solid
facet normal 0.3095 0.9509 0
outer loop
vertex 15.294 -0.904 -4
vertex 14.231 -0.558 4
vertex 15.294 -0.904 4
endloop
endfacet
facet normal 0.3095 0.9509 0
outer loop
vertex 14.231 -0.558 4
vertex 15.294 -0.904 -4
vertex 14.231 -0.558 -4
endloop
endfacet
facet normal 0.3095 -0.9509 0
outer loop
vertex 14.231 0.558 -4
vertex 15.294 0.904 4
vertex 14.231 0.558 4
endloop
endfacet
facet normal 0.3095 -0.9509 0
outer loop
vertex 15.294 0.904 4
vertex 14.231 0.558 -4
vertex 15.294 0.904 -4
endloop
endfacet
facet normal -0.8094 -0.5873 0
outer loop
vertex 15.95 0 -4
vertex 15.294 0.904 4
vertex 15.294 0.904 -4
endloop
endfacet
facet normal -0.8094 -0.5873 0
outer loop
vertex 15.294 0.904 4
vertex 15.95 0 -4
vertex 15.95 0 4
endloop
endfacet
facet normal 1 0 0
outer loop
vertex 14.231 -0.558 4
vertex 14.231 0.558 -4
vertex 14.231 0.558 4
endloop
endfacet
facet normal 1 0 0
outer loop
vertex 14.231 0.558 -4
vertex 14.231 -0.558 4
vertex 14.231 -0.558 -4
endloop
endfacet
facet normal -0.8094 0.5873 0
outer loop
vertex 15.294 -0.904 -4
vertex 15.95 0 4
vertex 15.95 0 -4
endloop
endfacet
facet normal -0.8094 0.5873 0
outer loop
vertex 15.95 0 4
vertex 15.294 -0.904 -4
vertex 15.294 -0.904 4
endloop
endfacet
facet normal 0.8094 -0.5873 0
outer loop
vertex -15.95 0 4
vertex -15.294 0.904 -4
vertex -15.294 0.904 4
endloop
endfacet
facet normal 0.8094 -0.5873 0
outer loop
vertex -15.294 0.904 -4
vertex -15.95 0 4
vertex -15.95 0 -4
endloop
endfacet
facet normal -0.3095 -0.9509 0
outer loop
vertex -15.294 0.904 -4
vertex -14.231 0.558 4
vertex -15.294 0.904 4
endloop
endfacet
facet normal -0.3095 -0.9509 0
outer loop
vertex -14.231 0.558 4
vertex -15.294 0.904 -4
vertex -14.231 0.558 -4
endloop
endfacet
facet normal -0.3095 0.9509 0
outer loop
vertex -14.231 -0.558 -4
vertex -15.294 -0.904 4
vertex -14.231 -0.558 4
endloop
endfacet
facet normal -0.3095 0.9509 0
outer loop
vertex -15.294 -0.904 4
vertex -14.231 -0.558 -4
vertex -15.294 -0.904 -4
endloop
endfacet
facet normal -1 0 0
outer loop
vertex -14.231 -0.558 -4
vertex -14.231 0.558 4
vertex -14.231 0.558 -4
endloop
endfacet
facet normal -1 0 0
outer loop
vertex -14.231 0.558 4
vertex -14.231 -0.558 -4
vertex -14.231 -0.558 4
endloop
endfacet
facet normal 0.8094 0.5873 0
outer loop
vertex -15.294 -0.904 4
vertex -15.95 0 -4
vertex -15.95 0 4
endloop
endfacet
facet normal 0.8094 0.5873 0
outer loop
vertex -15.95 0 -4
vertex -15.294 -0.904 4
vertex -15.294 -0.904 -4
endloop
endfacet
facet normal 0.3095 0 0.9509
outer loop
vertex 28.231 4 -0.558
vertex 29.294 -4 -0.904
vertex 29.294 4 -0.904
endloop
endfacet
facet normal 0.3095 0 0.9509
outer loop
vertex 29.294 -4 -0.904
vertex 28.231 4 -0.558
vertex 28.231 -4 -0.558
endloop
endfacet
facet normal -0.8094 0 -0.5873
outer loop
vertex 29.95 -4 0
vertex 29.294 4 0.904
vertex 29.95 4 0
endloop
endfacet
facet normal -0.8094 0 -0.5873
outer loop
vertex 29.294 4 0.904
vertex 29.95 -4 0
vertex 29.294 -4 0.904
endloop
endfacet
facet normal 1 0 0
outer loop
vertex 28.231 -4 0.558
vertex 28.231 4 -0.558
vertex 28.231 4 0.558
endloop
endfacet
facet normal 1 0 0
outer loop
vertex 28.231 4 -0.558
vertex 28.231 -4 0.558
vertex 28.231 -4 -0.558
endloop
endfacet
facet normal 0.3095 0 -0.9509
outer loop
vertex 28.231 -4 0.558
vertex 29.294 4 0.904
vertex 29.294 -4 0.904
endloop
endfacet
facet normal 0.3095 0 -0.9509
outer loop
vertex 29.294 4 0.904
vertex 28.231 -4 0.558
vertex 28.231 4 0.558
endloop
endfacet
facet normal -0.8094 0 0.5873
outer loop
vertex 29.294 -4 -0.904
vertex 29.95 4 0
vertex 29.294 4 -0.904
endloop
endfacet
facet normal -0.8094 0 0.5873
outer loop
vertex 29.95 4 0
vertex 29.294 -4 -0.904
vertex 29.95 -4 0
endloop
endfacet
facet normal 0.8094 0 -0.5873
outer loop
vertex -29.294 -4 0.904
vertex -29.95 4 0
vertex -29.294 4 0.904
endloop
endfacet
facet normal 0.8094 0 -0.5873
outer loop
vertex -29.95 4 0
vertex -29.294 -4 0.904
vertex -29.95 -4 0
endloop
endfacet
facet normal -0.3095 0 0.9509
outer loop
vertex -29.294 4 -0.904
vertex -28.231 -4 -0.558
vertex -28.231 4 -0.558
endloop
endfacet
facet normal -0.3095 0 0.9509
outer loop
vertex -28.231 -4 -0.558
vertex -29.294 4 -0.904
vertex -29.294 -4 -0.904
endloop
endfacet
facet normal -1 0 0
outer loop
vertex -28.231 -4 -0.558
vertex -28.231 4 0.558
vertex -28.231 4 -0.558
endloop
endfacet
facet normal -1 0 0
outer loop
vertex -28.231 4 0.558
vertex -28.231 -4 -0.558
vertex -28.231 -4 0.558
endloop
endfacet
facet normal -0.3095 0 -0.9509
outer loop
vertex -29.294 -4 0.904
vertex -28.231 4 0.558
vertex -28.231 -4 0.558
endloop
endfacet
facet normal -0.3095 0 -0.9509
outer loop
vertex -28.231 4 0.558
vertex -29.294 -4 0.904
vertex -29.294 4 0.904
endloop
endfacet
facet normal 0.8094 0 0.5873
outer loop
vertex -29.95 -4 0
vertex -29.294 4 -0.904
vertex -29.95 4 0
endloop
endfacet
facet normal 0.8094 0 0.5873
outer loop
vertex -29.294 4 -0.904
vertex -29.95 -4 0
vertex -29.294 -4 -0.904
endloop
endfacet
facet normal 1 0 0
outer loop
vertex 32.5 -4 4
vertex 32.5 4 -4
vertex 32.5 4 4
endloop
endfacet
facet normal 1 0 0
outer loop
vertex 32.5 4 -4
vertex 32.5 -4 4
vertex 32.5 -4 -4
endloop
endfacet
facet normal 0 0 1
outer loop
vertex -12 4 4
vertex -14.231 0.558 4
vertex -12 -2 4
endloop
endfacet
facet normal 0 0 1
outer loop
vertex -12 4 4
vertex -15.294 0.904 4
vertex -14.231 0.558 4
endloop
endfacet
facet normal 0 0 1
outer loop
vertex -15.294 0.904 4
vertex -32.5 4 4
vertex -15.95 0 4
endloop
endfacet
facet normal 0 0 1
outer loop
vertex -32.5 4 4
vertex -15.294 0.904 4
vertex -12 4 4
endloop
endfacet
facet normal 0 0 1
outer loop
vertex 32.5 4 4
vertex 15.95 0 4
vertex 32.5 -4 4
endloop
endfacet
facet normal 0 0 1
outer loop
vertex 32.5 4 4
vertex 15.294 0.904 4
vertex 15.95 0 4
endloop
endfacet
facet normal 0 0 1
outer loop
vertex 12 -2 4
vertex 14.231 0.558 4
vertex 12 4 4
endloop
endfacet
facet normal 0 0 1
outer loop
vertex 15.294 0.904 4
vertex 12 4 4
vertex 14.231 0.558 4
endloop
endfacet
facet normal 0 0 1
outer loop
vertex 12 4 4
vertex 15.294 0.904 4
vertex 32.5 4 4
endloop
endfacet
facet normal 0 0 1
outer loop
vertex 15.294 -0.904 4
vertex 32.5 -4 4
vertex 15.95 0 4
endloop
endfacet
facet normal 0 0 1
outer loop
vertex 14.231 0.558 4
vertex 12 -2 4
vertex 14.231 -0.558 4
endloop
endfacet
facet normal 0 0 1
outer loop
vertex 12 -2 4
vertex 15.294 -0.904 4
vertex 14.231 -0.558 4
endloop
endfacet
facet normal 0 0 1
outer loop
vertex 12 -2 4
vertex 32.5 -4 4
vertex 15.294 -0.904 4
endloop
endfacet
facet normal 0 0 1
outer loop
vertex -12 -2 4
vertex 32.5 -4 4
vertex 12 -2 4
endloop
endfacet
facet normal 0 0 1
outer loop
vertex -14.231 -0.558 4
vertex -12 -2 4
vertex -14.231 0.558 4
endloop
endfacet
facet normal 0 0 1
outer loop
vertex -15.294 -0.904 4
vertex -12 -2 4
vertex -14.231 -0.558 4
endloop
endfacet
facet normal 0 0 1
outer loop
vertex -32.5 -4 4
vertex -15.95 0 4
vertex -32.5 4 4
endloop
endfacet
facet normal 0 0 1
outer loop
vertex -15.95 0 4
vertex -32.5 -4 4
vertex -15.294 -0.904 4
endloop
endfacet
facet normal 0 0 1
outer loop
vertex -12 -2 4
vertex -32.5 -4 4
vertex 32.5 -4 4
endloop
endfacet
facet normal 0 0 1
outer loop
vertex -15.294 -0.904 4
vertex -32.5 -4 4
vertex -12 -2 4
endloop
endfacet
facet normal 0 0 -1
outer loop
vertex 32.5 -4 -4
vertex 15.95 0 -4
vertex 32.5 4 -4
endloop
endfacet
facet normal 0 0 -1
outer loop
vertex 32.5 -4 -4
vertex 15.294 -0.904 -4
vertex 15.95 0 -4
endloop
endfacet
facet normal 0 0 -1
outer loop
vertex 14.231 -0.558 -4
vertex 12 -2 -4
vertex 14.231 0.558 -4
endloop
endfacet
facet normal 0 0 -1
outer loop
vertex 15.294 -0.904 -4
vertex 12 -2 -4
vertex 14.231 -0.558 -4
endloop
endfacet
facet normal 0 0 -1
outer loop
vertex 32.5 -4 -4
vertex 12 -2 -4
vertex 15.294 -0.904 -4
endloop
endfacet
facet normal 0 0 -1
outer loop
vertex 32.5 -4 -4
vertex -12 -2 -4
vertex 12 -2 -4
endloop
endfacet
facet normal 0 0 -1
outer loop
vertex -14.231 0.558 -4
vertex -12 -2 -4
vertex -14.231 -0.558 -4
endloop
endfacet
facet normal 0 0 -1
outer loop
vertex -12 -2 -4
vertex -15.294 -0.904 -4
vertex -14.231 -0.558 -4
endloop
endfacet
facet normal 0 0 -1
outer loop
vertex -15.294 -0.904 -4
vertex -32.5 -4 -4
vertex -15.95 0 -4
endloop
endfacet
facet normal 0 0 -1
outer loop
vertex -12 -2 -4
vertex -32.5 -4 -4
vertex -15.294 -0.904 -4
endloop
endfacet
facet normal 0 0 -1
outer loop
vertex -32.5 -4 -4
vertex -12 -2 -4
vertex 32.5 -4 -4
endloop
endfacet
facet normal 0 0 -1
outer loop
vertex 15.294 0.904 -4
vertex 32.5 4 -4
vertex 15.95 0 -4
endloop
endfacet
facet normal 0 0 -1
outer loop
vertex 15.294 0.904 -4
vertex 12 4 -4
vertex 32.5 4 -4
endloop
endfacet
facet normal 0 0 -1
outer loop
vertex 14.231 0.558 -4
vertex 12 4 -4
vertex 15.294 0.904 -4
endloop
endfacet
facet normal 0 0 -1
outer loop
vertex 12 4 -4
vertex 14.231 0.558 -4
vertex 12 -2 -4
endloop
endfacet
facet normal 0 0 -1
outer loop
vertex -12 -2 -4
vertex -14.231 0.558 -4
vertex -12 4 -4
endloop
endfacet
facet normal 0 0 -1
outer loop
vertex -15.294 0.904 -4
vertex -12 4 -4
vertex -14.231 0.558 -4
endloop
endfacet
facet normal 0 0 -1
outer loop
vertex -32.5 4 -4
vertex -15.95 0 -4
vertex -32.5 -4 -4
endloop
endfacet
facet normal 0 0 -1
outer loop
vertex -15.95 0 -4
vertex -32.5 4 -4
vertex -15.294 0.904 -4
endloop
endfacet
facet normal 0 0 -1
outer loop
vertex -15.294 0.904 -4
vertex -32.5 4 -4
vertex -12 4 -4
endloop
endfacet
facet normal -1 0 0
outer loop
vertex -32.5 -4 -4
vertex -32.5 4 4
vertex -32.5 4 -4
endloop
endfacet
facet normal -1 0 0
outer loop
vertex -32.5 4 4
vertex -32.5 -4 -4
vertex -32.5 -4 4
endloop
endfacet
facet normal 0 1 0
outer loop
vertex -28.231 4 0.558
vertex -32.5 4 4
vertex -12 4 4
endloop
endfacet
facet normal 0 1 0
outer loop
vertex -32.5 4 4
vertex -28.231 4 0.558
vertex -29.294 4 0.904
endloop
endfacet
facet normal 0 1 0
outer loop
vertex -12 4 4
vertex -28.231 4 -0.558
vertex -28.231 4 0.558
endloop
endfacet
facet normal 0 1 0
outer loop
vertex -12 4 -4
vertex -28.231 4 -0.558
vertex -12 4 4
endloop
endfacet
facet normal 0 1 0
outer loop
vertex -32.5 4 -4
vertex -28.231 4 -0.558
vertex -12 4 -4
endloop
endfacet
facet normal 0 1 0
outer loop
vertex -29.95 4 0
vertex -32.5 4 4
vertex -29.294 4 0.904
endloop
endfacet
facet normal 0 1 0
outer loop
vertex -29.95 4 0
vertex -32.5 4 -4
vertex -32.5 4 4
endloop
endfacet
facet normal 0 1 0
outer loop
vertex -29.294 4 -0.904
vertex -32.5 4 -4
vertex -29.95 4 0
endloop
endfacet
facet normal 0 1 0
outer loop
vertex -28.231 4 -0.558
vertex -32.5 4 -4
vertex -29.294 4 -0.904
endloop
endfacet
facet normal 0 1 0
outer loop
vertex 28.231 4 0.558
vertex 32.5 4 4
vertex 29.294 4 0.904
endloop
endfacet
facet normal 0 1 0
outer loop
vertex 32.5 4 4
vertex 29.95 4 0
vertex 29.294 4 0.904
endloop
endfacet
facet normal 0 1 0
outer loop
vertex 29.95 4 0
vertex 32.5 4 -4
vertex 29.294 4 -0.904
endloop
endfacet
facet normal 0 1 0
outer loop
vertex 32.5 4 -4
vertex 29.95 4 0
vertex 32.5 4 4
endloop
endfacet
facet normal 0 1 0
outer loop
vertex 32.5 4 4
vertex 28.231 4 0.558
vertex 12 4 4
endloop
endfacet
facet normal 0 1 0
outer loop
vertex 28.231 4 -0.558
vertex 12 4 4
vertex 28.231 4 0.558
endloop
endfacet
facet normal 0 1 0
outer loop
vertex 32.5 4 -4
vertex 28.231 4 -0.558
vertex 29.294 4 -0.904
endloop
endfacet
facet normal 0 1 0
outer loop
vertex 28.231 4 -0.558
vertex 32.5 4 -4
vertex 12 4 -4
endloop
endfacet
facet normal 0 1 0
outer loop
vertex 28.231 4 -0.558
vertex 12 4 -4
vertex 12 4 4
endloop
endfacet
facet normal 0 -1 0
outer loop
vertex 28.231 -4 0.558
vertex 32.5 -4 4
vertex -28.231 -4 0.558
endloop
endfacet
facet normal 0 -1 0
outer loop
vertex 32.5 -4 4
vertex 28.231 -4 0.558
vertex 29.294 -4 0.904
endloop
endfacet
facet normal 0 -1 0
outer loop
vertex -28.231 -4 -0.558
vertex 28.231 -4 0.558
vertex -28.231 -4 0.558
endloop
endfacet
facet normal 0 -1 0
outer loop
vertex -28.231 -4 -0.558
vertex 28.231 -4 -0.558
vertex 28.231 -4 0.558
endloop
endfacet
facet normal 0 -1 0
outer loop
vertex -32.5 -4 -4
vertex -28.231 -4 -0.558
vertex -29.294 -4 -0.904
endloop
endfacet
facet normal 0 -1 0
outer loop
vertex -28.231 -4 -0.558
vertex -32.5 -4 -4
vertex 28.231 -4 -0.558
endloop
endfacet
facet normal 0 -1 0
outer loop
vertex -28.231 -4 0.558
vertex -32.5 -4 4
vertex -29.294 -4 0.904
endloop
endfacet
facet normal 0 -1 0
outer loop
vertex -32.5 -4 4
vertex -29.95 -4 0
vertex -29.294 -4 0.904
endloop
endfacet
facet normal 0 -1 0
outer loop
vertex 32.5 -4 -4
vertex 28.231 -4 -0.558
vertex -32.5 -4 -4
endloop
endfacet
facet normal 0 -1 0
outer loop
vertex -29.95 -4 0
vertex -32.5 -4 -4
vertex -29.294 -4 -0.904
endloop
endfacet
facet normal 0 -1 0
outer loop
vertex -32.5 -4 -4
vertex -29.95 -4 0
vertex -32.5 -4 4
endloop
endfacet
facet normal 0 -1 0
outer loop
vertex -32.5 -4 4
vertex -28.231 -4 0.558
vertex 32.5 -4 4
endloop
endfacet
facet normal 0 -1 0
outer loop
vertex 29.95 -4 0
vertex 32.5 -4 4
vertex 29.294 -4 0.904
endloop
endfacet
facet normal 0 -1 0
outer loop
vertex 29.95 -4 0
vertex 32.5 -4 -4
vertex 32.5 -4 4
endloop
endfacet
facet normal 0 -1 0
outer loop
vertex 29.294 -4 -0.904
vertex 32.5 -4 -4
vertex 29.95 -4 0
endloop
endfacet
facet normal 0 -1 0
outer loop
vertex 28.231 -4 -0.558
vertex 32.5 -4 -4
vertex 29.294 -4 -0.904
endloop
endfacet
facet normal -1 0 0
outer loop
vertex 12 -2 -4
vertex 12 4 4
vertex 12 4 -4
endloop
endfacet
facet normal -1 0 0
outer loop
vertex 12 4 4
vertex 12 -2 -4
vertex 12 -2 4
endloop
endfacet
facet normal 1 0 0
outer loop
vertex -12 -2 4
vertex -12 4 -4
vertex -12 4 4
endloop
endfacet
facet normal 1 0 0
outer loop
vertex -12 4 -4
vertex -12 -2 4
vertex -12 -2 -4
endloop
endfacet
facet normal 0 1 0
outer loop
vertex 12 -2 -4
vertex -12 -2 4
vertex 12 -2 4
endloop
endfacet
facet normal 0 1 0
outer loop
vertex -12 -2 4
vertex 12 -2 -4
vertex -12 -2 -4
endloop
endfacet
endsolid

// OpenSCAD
difference(){
    cube([65, 8, 8], true);
    
    translate([0,2,0])
    cube([24, 8, 9], true);
    
    
    
    for(i=[0:1])
    mirror([i,0,0])
    translate([15,0,-10])
    cylinder(20, d=1.9);
    
    for(i=[0:1])
    mirror([i,0,0])
    translate([58/2,10,0])
    rotate([90,0,0])
    cylinder(20, d=1.9);
    
    
}
